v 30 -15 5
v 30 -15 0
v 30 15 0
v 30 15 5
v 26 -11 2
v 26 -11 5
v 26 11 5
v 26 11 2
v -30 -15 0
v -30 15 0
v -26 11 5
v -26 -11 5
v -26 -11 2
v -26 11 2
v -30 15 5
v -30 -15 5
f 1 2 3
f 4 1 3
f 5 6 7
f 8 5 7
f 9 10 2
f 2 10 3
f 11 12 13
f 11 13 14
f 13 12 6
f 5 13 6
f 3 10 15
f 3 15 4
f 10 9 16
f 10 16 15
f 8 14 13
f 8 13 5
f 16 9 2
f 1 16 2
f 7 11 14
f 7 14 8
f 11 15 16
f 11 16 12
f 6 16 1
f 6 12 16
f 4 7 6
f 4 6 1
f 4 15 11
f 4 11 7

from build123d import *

# Parameters (mm, degrees)
SKETCH_W     = 60
SKETCH_H     = 30
PAD_DEPTH    = 5
SKETCH001_W  = 52
SKETCH001_H  = 22
POCKET_DEPTH = 3


with BuildPart() as part:
    # Sketch → Pad (new body)
    with BuildSketch(Plane.XY):
        Rectangle(SKETCH_W, SKETCH_H)
    extrude(amount=PAD_DEPTH)

    # Sketch001 (on DatumPlane) → Pocket (cut)
    with BuildSketch(Plane.XY.offset(5)):
        Rectangle(SKETCH001_W, SKETCH001_H)
    extrude(amount=-POCKET_DEPTH, mode=Mode.SUBTRACT)


solid = part.part
